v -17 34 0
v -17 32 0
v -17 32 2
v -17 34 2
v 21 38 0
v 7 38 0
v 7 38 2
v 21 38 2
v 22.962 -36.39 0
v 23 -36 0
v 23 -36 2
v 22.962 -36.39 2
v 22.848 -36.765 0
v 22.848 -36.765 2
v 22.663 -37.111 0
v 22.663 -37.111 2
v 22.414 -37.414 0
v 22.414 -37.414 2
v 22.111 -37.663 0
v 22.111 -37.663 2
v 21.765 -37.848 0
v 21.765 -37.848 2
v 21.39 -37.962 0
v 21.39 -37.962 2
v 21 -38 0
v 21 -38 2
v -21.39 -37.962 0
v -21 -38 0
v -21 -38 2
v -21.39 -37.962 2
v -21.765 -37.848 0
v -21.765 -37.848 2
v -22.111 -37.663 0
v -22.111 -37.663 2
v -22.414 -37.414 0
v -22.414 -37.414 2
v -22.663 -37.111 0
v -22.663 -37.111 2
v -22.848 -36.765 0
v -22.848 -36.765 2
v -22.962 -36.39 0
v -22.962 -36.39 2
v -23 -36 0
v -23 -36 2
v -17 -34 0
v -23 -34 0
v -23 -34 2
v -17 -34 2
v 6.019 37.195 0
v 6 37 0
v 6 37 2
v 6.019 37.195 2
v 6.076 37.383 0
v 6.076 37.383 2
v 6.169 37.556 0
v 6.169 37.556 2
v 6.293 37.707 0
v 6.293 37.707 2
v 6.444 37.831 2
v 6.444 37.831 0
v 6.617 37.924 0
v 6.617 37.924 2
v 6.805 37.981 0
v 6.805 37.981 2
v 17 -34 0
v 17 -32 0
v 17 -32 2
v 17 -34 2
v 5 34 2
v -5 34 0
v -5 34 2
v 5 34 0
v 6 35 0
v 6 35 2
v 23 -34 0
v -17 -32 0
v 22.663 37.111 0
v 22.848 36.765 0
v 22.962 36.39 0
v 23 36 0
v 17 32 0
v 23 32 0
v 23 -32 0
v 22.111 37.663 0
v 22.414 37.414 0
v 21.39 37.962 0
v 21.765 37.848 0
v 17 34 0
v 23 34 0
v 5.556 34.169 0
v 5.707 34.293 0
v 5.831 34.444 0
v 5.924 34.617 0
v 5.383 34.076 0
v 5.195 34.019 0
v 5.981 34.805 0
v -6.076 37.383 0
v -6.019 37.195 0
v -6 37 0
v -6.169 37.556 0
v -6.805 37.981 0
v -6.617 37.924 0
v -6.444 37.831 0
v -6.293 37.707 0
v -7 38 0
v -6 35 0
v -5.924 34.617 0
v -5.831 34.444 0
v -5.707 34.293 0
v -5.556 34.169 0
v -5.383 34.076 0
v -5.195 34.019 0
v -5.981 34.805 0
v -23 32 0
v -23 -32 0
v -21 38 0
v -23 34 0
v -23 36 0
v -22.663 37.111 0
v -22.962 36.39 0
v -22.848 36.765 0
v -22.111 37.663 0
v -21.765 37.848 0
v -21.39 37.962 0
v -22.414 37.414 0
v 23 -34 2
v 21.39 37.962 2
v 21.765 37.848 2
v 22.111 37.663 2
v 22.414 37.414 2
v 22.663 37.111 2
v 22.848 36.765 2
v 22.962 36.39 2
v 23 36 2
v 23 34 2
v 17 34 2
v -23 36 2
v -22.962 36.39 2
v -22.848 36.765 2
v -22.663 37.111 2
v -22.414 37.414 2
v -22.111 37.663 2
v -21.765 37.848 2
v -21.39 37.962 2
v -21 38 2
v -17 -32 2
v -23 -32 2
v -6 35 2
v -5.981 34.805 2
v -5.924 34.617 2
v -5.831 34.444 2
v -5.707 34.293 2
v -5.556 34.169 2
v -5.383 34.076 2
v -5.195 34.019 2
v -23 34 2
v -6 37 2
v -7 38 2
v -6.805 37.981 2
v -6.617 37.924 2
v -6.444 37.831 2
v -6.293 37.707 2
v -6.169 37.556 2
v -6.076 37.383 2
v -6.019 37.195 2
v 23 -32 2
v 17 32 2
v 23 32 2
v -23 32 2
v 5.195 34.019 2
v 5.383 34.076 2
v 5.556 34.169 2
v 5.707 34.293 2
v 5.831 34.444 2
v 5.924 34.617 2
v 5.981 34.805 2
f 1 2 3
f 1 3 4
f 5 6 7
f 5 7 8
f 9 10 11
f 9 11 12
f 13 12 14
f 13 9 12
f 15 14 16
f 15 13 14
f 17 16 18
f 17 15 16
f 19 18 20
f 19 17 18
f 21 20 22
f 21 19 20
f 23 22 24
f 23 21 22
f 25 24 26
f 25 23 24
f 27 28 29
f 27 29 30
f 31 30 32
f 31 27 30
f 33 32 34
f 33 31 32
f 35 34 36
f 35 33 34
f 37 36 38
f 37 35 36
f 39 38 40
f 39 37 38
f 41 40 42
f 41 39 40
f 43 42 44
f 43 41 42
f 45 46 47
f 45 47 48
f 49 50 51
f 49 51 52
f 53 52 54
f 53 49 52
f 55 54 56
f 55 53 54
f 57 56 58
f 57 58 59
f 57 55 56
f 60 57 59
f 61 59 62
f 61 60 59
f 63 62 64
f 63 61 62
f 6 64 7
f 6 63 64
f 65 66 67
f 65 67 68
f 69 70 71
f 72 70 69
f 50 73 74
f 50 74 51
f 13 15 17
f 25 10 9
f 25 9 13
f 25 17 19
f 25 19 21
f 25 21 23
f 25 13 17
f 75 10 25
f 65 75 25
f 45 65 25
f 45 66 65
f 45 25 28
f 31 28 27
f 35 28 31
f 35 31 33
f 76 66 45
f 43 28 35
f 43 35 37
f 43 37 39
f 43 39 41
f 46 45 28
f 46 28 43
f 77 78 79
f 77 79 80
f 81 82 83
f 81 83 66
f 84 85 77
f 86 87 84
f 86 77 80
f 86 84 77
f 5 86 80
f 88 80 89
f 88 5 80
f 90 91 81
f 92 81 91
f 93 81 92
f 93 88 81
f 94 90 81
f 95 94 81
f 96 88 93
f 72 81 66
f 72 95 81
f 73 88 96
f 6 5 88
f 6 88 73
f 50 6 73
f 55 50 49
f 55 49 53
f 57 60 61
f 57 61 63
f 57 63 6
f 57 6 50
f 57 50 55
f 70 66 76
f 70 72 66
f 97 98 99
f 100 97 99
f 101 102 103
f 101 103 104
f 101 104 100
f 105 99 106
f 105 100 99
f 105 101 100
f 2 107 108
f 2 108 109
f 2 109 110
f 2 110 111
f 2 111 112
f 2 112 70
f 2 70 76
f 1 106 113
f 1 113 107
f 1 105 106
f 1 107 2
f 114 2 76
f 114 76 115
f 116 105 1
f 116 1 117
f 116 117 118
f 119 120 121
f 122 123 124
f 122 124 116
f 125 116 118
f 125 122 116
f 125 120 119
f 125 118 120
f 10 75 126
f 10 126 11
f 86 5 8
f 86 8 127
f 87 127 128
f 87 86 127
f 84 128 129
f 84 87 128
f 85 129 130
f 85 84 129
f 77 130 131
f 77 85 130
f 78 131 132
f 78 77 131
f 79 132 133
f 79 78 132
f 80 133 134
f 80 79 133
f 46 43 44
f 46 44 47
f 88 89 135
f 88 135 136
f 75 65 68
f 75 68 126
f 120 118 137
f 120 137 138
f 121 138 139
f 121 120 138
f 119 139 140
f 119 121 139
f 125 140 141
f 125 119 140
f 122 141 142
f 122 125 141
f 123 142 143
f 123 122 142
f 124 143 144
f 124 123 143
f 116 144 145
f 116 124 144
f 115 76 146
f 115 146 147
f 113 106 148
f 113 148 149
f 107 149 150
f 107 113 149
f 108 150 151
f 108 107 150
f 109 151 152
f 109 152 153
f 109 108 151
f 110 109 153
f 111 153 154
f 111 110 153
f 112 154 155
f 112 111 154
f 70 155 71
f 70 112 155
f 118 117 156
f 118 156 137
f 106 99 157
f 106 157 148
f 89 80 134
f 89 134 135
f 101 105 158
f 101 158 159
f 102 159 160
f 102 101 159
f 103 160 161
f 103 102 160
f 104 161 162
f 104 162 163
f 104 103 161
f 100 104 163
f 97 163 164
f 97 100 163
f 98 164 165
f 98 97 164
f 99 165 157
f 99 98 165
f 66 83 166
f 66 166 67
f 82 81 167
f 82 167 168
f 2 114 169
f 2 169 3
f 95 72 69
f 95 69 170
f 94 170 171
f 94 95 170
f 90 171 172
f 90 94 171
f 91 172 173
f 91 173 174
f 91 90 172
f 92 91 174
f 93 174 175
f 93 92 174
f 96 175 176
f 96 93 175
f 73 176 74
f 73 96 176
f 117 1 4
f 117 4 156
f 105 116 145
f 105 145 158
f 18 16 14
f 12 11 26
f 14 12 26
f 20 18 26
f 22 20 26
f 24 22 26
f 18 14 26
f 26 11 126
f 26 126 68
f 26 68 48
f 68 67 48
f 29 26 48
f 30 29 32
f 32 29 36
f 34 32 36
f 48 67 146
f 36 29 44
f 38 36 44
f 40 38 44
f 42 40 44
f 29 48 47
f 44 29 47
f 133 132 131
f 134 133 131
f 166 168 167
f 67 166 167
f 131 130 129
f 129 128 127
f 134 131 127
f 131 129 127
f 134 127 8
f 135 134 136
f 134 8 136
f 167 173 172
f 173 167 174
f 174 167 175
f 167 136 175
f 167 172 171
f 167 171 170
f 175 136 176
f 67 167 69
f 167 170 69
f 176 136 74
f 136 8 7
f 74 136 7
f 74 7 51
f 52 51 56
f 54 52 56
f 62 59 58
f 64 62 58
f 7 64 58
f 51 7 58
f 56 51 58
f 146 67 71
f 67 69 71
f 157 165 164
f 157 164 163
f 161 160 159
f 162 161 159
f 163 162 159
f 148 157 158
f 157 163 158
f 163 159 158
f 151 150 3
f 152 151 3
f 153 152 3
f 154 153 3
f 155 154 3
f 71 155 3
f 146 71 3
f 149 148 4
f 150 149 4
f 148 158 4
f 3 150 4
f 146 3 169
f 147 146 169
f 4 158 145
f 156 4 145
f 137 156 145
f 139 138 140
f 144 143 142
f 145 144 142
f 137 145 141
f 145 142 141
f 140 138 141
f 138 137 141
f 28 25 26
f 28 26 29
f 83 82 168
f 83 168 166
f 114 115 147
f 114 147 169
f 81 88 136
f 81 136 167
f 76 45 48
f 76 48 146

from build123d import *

# Parameters (mm, degrees)
BOSS_EXTRUDE1_DEPTH = 2


with BuildPart() as part:
    # Sketch1 → Boss-Extrude1 (new body)
    with BuildSketch(Plane.XY):
        with BuildLine():
            Line((-21, 38), (-7, 38))
            ThreePointArc((-7, 38), (-6.292893219, 37.707106781), (-6, 37))
            Line((-6, 37), (-6, 35))
            ThreePointArc((-6, 35), (-5.707106781, 34.292893219), (-5, 34))
            Line((-5, 34), (5, 34))
            ThreePointArc((5, 34), (5.707106781, 34.292893219), (6, 35))
            Line((6, 35), (6, 37))
            ThreePointArc((6, 37), (6.292893219, 37.707106781), (7, 38))
            Line((7, 38), (21, 38))
            ThreePointArc((21, 38), (22.414213562, 37.414213562), (23, 36))
            Line((23, 36), (23, 34))
            Line((23, 34), (17, 34))
            Line((17, 34), (17, 32))
            Line((17, 32), (23, 32))
            Line((23, 32), (23, -32))
            Line((23, -32), (17, -32))
            Line((17, -32), (17, -34))
            Line((17, -34), (23, -34))
            Line((23, -34), (23, -36))
            ThreePointArc((23, -36), (22.414213562, -37.414213562), (21, -38))
            Line((21, -38), (-21, -38))
            ThreePointArc((-21, -38), (-22.414213562, -37.414213562), (-23, -36))
            Line((-23, -36), (-23, -34))
            Line((-23, -34), (-17, -34))
            Line((-17, -34), (-17, -32))
            Line((-17, -32), (-23, -32))
            Line((-23, -32), (-23, 32))
            Line((-23, 32), (-17, 32))
            Line((-17, 32), (-17, 34))
            Line((-17, 34), (-23, 34))
            Line((-23, 34), (-23, 36))
            ThreePointArc((-23, 36), (-22.414213562, 37.414213562), (-21, 38))
        make_face()
    extrude(amount=BOSS_EXTRUDE1_DEPTH)


solid = part.part
